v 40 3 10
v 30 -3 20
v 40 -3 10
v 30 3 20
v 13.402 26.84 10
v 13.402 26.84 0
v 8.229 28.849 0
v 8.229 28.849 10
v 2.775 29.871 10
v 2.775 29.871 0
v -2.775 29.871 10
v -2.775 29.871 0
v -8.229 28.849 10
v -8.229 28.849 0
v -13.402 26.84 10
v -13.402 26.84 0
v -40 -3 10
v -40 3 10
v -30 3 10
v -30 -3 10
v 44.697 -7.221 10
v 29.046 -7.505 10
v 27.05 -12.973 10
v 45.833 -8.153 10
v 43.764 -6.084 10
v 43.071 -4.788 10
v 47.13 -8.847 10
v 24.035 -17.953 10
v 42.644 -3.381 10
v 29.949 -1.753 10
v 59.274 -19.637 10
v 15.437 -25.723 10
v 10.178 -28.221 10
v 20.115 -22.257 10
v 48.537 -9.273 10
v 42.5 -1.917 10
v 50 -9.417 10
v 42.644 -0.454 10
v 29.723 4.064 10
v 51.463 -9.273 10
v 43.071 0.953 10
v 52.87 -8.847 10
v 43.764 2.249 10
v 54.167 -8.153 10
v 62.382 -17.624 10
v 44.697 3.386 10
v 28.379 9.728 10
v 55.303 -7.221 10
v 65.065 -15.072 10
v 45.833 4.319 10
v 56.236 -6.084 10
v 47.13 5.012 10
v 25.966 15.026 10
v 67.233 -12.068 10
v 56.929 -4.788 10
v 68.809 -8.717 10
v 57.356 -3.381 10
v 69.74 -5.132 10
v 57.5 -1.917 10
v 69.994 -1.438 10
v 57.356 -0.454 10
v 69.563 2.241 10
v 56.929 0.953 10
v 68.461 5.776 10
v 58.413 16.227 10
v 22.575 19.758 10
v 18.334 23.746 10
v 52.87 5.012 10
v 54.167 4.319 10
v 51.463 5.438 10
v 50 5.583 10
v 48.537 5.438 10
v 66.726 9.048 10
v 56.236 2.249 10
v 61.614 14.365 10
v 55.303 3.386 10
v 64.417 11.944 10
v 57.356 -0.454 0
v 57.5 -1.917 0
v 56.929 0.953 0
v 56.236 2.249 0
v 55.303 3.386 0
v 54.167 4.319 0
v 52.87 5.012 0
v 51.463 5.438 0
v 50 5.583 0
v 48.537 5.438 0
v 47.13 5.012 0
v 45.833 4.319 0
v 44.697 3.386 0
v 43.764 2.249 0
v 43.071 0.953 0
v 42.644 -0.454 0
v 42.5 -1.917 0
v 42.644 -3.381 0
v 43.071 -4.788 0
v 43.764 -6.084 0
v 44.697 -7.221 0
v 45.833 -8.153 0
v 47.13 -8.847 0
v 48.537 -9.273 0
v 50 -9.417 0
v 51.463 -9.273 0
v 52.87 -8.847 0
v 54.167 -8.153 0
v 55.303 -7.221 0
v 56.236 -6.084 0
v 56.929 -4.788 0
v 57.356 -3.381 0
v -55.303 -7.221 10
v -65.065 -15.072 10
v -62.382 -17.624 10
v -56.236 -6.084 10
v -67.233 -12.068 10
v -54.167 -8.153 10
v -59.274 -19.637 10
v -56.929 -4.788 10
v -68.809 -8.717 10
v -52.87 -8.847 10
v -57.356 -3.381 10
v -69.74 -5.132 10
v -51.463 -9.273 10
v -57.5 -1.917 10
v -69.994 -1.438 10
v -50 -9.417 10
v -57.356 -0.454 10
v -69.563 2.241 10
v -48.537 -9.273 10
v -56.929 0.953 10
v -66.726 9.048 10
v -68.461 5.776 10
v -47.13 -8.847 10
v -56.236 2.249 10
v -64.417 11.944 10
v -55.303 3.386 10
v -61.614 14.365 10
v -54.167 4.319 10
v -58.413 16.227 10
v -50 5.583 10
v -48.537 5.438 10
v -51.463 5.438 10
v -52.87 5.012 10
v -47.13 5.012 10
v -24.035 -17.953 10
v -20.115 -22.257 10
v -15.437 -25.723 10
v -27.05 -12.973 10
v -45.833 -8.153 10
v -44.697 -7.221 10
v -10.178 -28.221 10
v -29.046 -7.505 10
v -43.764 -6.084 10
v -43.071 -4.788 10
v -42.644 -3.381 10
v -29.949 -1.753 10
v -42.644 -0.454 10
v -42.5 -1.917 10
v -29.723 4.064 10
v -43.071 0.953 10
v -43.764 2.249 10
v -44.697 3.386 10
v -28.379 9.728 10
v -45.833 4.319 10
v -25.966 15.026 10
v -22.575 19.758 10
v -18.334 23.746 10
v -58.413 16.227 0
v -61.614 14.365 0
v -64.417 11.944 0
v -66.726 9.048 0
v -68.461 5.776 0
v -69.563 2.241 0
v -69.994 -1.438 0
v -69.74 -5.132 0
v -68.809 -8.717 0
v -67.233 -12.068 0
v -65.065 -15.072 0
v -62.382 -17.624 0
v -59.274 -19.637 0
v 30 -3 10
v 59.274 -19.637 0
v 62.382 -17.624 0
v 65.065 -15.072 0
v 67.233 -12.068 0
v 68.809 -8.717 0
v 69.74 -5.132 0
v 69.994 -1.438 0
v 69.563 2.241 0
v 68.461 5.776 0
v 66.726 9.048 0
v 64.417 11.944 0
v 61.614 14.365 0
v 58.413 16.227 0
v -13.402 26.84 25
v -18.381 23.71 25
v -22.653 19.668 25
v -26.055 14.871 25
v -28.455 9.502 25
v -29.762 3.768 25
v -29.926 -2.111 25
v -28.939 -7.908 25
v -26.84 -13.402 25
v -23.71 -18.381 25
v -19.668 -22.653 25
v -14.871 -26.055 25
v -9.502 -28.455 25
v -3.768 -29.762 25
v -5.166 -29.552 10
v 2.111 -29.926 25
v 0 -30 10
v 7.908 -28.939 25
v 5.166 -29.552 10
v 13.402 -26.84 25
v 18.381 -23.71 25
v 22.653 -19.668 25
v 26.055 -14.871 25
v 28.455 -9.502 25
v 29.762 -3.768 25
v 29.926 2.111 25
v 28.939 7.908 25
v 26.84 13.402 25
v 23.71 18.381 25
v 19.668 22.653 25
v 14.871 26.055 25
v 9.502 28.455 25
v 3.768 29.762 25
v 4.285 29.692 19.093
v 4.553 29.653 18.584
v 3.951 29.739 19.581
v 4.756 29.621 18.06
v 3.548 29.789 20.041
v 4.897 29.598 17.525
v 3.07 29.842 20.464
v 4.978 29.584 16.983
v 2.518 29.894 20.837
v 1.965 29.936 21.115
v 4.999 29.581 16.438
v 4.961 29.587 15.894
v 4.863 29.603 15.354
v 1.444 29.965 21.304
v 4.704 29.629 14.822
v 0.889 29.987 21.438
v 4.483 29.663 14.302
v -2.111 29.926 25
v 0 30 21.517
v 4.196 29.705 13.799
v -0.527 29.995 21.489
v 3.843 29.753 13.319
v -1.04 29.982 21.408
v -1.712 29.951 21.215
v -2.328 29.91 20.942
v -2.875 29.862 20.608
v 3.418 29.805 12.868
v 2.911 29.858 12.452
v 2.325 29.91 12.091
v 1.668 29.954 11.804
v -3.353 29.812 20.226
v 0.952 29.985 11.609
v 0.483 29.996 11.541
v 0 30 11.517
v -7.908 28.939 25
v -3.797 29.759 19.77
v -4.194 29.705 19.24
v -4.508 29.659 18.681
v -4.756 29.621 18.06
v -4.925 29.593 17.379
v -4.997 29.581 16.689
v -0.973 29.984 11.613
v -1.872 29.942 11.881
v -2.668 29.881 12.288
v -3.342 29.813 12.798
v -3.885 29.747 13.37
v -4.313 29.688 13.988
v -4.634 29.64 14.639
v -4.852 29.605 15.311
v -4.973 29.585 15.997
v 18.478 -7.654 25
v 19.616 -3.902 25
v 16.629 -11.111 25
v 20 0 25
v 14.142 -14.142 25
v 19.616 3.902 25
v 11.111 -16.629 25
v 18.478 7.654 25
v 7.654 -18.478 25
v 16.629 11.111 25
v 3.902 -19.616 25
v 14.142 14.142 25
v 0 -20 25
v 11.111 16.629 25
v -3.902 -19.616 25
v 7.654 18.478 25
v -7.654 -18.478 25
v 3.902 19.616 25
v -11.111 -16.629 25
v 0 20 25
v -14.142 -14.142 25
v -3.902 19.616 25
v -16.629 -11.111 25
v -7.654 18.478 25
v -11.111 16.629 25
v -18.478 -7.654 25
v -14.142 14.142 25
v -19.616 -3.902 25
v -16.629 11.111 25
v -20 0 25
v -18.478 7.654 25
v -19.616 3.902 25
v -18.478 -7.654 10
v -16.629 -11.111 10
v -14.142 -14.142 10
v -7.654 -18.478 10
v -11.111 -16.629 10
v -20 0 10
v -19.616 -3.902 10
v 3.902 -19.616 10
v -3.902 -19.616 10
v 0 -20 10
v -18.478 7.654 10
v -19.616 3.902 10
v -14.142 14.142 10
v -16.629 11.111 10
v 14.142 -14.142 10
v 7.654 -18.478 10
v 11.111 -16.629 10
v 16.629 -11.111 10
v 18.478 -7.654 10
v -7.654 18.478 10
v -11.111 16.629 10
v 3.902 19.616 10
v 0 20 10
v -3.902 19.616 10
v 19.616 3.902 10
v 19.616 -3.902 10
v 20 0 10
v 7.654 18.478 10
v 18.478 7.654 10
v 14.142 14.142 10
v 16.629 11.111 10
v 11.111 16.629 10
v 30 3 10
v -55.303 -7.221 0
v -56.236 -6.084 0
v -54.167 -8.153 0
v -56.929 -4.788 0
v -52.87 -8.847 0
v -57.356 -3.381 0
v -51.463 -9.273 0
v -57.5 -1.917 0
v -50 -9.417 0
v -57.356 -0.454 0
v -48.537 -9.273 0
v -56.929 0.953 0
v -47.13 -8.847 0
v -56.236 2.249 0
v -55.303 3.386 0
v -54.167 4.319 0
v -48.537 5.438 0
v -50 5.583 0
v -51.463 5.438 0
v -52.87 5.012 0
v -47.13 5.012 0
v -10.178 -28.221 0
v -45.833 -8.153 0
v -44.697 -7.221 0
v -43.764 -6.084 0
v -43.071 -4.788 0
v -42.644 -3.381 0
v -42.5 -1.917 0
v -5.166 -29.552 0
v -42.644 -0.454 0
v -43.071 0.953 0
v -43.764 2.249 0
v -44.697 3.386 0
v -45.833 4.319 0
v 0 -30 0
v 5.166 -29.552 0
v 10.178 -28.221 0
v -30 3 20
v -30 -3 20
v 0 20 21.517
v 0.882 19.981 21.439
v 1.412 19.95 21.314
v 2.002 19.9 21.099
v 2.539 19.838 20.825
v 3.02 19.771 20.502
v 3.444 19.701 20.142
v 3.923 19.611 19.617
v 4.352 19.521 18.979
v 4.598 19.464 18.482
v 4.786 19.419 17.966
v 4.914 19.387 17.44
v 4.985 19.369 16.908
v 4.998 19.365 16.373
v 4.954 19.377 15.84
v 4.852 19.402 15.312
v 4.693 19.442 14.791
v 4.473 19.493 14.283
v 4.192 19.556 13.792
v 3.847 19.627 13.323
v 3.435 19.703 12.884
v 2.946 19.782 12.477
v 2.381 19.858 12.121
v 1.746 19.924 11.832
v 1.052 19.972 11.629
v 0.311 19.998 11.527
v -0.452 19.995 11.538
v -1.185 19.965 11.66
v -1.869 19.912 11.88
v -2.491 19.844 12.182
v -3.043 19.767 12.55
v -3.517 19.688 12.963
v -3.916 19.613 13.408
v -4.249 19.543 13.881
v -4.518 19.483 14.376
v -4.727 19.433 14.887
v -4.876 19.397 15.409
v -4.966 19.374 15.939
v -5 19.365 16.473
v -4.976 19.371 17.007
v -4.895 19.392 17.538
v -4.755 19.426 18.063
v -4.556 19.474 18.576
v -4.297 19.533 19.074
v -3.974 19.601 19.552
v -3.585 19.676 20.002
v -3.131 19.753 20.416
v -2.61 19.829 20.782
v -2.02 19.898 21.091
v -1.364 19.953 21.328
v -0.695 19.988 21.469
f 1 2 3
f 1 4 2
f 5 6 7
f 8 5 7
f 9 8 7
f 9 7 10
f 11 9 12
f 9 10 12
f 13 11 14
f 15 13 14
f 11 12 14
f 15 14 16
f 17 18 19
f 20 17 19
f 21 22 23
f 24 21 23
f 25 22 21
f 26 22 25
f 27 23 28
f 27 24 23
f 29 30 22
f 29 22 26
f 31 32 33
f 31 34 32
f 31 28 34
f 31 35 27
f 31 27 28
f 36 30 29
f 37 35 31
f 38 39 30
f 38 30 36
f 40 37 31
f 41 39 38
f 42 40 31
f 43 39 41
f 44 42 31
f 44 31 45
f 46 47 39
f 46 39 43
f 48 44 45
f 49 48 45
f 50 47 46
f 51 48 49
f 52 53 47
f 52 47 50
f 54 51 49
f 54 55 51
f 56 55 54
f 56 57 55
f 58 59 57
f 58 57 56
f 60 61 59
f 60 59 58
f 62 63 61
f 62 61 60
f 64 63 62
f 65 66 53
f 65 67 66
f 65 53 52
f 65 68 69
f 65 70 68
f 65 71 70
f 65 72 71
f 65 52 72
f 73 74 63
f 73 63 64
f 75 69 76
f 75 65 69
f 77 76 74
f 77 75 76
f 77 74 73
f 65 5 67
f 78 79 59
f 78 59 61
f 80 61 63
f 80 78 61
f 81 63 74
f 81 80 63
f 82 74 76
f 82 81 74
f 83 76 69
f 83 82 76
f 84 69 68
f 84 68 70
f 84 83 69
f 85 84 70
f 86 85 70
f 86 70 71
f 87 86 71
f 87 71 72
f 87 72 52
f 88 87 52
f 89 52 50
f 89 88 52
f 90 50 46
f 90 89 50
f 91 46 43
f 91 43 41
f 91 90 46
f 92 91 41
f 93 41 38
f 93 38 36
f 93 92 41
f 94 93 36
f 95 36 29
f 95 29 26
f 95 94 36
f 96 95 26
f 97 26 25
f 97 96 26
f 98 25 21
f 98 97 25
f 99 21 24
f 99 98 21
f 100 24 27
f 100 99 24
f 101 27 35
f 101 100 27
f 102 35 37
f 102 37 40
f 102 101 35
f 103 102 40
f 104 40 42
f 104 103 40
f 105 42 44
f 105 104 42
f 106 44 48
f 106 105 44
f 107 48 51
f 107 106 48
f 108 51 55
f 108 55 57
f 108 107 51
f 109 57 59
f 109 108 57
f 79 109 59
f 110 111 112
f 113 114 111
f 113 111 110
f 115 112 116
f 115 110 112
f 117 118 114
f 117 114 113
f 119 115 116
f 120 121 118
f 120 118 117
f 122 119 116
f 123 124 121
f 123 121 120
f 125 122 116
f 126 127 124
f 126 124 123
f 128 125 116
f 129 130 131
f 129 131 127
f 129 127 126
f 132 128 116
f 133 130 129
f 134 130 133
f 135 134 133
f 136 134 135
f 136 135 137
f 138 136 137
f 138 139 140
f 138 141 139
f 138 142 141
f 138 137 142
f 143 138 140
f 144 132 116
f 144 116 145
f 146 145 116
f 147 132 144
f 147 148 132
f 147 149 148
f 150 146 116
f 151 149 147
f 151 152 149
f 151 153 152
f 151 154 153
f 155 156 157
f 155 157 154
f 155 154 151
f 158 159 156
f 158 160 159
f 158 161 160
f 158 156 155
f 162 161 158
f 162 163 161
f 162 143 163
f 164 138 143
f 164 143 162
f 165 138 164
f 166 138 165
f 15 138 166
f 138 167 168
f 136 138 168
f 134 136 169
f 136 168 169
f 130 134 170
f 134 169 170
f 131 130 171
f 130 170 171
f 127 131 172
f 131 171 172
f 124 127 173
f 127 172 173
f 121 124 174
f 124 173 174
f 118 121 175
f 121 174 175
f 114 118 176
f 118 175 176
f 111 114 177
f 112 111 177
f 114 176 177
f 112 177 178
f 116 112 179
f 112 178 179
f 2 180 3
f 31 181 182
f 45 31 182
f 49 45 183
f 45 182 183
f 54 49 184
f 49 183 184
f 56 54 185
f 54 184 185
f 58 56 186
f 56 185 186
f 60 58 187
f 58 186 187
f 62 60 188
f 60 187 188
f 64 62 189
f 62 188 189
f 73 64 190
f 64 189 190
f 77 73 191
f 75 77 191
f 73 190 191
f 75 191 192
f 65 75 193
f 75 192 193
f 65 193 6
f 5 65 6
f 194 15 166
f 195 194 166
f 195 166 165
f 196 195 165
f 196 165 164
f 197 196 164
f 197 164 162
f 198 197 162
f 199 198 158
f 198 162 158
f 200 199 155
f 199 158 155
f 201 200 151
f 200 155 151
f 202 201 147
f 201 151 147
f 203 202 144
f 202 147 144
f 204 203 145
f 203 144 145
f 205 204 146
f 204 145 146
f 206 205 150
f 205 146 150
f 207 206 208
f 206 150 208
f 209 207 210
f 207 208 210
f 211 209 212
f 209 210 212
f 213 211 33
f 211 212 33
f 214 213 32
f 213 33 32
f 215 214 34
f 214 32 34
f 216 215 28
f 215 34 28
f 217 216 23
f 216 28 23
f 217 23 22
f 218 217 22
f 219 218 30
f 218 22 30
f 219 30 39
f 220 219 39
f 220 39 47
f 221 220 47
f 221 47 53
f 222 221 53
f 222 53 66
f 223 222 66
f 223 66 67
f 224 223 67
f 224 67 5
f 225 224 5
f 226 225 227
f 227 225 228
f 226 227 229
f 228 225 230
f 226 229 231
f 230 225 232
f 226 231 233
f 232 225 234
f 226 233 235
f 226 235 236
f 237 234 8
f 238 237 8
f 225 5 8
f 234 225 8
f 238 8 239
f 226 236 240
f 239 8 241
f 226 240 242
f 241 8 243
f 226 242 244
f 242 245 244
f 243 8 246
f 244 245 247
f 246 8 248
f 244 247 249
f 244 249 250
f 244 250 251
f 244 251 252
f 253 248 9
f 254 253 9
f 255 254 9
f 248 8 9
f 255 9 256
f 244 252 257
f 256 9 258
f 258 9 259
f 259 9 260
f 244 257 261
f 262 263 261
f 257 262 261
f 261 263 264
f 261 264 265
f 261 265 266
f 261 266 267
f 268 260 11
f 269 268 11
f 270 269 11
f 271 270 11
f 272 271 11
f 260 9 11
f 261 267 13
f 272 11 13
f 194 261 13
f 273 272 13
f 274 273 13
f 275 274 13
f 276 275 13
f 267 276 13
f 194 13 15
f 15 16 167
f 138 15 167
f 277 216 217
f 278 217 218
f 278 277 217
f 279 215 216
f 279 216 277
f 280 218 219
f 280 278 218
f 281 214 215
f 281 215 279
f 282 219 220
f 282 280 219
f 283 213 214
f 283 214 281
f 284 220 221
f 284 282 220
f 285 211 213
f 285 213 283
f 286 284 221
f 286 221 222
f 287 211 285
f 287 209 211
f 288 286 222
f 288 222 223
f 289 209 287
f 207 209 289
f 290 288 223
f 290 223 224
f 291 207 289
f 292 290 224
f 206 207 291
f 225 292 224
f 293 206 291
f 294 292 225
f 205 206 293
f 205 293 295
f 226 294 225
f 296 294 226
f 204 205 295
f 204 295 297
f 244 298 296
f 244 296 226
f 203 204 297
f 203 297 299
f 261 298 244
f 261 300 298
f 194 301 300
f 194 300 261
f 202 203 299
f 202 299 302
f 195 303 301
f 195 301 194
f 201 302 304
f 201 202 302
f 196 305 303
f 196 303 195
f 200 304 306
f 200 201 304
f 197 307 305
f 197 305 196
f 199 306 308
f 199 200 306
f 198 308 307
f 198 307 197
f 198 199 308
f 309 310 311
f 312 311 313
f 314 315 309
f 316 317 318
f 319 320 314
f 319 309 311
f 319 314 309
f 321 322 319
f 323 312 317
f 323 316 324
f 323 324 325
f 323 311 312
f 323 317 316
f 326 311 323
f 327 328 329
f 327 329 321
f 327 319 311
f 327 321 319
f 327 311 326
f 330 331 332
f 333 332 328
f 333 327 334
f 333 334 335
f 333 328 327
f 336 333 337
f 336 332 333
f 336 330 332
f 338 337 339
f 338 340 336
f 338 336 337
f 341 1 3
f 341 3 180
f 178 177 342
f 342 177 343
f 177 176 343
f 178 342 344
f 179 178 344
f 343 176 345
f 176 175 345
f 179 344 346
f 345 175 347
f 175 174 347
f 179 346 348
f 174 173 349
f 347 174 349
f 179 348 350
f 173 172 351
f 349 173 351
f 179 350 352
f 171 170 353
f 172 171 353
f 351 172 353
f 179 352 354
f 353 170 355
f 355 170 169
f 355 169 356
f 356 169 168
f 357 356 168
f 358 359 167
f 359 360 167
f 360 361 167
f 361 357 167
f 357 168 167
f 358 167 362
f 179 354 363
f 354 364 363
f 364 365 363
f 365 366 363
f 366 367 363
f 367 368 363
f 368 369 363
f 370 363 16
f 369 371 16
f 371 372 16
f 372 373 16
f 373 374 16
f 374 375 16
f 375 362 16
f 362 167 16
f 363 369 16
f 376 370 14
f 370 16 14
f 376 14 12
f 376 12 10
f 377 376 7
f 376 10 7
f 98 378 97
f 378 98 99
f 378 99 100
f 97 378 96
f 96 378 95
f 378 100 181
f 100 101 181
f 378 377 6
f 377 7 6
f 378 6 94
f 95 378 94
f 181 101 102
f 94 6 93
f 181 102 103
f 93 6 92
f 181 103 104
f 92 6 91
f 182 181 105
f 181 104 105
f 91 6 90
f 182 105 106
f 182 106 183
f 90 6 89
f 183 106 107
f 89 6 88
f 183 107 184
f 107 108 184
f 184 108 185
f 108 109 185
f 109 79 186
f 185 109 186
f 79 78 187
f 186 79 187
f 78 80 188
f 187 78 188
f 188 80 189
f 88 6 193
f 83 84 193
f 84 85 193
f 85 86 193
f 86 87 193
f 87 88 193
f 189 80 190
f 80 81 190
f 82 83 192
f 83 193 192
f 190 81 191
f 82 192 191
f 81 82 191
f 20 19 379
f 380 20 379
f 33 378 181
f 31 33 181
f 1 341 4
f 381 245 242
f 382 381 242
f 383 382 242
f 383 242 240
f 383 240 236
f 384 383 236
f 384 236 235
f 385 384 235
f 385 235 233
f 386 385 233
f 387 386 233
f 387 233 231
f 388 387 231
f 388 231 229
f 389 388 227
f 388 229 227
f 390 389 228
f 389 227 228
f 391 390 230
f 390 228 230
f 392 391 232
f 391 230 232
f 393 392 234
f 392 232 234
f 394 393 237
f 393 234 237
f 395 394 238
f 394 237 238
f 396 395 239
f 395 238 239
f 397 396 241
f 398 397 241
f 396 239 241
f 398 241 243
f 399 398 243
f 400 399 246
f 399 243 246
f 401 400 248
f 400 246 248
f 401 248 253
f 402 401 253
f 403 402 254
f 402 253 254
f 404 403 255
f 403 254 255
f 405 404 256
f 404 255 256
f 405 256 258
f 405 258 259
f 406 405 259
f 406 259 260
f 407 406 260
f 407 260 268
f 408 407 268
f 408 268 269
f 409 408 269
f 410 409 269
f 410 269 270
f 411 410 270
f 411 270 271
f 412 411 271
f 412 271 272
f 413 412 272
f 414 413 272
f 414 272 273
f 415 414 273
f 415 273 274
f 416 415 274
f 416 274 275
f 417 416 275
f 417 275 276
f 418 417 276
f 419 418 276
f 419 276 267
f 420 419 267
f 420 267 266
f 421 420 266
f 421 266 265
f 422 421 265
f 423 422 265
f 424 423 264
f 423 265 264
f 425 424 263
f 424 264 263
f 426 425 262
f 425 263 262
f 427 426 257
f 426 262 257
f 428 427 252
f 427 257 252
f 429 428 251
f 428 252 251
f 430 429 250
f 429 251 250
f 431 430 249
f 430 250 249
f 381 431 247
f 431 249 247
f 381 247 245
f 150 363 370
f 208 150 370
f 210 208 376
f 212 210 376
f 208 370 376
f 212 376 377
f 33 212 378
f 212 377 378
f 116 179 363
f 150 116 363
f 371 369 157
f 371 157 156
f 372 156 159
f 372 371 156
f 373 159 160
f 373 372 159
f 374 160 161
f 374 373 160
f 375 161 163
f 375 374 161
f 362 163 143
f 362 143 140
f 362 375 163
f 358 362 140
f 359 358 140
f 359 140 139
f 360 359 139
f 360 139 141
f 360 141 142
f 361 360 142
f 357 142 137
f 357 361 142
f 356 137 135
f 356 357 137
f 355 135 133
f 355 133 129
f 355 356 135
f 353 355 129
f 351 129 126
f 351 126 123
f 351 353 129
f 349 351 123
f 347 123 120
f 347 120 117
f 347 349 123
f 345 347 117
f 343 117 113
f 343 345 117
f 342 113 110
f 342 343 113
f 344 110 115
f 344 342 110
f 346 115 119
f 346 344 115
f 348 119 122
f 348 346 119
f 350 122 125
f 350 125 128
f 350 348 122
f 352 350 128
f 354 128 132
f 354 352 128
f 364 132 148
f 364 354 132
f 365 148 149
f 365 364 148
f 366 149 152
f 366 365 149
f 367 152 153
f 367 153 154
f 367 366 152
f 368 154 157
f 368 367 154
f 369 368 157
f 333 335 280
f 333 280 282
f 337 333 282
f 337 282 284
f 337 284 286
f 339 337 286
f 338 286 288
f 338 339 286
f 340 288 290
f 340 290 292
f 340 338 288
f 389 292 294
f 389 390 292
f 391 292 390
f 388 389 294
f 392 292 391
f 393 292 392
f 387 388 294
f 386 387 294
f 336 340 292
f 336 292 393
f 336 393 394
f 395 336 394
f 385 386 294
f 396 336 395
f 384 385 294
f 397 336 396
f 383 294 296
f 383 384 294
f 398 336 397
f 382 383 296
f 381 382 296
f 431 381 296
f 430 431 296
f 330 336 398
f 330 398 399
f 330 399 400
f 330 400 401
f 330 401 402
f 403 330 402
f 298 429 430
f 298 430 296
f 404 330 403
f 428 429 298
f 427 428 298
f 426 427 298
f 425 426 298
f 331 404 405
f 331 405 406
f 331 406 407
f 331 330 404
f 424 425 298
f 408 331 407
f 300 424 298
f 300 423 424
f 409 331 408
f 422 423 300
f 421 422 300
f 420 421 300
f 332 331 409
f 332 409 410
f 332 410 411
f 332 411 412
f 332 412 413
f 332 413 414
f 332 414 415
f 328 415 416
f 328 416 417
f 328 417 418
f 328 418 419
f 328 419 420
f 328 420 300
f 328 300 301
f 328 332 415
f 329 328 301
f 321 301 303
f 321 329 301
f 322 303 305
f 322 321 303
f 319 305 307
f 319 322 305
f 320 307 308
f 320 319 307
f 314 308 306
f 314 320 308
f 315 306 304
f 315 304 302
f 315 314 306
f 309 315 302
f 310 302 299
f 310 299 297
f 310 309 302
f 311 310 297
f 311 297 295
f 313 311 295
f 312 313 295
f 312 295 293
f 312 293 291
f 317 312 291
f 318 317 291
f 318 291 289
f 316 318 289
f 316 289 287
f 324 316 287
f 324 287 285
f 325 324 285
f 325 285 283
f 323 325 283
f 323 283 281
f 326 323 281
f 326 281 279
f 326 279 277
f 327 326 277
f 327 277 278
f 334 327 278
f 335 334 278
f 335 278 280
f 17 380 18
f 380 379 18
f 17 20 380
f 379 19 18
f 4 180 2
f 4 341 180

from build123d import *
from build123d.topology import SkipClean

# Parameters (mm, degrees)
SKETCH1_R             = 7.5
BOSS_EXTRUDE1_DEPTH   = 10
SKETCH2_R             = 30
SKETCH2_R_2           = 20
BOSS_EXTRUDE2_DEPTH   = 15
BOSS_EXTRUDE9_DEPTH   = 3
BOSS_EXTRUDE9_2_DEPTH = 3
SKETCH9_R             = 5
CUT_EXTRUDE1_DEPTH    = 12


with BuildPart() as part:
    # Sketch1 → Boss-Extrude1 (new body)
    with BuildSketch(Plane.XY):
        with BuildLine():
            Line((-59.27364878, -19.637458905), (-10.178432842, -28.220551109))
            ThreePointArc((-10.178432842, -28.220551109), (0, -30), (10.178432842, -28.220551109))
            Line((10.178432842, -28.220551109), (59.27364878, -19.637458905))
            ThreePointArc((59.27364878, -19.637458905), (69.994245494, -1.437693094), (58.413127348, 16.226971408))
            Line((58.413127348, 16.226971408), (13.402098279, 26.839965755))
            ThreePointArc((13.402098279, 26.839965755), (0, 30), (-13.402098279, 26.839965755))
            Line((-13.402098279, 26.839965755), (-58.413127348, 16.226971408))
            ThreePointArc((-58.413127348, 16.226971408), (-69.994245494, -1.437693094), (-59.27364878, -19.637458905))
        make_face()
        with Locations((-50, -1.917429608)):
            Circle(SKETCH1_R, mode=Mode.SUBTRACT)
        with Locations((50, -1.917429608)):
            Circle(SKETCH1_R, mode=Mode.SUBTRACT)
    extrude(amount=BOSS_EXTRUDE1_DEPTH)

    # Sketch2 → Boss-Extrude2 (add)
    with BuildSketch(Plane.XY.offset(10)):
        with Locations(Location((0, 0, 0), (0, 0, 116.534500166))):
            Circle(SKETCH2_R)
        Circle(SKETCH2_R_2, mode=Mode.SUBTRACT)
    extrude(amount=BOSS_EXTRUDE2_DEPTH)

    # Sketch9 → Cut-Extrude1 (cut)
    with SkipClean():  # the faces are left unmerged after this step: merging them gives an invalid solid
        with BuildSketch(Plane(origin=(0, 30, 0), x_dir=(1, 0, 0), z_dir=(0, 1, 0))):
            with Locations(Location((0, -16.517299194, 0), (0, 0, 270))):
                Circle(SKETCH9_R)
        extrude(amount=-CUT_EXTRUDE1_DEPTH, mode=Mode.SUBTRACT)


with BuildPart() as body_2:
    # Sketch7 → Boss-Extrude9 (new, symmetric)
    with BuildSketch(Plane(origin=(0, 0, 0), x_dir=(1, 0, 0), z_dir=(0, 1, 0))):
        Polygon((-30, -10), (-30, -20), (-40, -10), align=None)
    extrude(amount=BOSS_EXTRUDE9_DEPTH, both=True)


with BuildPart() as body_3:
    # Sketch7 → Boss-Extrude9 2 (new, symmetric)
    with BuildSketch(Plane(origin=(0, 0, 0), x_dir=(1, 0, 0), z_dir=(0, 1, 0))):
        Polygon((30, -20), (40, -10), (30, -10), align=None)
    extrude(amount=BOSS_EXTRUDE9_2_DEPTH, both=True)


solid = Compound([part.part, body_2.part, body_3.part])
